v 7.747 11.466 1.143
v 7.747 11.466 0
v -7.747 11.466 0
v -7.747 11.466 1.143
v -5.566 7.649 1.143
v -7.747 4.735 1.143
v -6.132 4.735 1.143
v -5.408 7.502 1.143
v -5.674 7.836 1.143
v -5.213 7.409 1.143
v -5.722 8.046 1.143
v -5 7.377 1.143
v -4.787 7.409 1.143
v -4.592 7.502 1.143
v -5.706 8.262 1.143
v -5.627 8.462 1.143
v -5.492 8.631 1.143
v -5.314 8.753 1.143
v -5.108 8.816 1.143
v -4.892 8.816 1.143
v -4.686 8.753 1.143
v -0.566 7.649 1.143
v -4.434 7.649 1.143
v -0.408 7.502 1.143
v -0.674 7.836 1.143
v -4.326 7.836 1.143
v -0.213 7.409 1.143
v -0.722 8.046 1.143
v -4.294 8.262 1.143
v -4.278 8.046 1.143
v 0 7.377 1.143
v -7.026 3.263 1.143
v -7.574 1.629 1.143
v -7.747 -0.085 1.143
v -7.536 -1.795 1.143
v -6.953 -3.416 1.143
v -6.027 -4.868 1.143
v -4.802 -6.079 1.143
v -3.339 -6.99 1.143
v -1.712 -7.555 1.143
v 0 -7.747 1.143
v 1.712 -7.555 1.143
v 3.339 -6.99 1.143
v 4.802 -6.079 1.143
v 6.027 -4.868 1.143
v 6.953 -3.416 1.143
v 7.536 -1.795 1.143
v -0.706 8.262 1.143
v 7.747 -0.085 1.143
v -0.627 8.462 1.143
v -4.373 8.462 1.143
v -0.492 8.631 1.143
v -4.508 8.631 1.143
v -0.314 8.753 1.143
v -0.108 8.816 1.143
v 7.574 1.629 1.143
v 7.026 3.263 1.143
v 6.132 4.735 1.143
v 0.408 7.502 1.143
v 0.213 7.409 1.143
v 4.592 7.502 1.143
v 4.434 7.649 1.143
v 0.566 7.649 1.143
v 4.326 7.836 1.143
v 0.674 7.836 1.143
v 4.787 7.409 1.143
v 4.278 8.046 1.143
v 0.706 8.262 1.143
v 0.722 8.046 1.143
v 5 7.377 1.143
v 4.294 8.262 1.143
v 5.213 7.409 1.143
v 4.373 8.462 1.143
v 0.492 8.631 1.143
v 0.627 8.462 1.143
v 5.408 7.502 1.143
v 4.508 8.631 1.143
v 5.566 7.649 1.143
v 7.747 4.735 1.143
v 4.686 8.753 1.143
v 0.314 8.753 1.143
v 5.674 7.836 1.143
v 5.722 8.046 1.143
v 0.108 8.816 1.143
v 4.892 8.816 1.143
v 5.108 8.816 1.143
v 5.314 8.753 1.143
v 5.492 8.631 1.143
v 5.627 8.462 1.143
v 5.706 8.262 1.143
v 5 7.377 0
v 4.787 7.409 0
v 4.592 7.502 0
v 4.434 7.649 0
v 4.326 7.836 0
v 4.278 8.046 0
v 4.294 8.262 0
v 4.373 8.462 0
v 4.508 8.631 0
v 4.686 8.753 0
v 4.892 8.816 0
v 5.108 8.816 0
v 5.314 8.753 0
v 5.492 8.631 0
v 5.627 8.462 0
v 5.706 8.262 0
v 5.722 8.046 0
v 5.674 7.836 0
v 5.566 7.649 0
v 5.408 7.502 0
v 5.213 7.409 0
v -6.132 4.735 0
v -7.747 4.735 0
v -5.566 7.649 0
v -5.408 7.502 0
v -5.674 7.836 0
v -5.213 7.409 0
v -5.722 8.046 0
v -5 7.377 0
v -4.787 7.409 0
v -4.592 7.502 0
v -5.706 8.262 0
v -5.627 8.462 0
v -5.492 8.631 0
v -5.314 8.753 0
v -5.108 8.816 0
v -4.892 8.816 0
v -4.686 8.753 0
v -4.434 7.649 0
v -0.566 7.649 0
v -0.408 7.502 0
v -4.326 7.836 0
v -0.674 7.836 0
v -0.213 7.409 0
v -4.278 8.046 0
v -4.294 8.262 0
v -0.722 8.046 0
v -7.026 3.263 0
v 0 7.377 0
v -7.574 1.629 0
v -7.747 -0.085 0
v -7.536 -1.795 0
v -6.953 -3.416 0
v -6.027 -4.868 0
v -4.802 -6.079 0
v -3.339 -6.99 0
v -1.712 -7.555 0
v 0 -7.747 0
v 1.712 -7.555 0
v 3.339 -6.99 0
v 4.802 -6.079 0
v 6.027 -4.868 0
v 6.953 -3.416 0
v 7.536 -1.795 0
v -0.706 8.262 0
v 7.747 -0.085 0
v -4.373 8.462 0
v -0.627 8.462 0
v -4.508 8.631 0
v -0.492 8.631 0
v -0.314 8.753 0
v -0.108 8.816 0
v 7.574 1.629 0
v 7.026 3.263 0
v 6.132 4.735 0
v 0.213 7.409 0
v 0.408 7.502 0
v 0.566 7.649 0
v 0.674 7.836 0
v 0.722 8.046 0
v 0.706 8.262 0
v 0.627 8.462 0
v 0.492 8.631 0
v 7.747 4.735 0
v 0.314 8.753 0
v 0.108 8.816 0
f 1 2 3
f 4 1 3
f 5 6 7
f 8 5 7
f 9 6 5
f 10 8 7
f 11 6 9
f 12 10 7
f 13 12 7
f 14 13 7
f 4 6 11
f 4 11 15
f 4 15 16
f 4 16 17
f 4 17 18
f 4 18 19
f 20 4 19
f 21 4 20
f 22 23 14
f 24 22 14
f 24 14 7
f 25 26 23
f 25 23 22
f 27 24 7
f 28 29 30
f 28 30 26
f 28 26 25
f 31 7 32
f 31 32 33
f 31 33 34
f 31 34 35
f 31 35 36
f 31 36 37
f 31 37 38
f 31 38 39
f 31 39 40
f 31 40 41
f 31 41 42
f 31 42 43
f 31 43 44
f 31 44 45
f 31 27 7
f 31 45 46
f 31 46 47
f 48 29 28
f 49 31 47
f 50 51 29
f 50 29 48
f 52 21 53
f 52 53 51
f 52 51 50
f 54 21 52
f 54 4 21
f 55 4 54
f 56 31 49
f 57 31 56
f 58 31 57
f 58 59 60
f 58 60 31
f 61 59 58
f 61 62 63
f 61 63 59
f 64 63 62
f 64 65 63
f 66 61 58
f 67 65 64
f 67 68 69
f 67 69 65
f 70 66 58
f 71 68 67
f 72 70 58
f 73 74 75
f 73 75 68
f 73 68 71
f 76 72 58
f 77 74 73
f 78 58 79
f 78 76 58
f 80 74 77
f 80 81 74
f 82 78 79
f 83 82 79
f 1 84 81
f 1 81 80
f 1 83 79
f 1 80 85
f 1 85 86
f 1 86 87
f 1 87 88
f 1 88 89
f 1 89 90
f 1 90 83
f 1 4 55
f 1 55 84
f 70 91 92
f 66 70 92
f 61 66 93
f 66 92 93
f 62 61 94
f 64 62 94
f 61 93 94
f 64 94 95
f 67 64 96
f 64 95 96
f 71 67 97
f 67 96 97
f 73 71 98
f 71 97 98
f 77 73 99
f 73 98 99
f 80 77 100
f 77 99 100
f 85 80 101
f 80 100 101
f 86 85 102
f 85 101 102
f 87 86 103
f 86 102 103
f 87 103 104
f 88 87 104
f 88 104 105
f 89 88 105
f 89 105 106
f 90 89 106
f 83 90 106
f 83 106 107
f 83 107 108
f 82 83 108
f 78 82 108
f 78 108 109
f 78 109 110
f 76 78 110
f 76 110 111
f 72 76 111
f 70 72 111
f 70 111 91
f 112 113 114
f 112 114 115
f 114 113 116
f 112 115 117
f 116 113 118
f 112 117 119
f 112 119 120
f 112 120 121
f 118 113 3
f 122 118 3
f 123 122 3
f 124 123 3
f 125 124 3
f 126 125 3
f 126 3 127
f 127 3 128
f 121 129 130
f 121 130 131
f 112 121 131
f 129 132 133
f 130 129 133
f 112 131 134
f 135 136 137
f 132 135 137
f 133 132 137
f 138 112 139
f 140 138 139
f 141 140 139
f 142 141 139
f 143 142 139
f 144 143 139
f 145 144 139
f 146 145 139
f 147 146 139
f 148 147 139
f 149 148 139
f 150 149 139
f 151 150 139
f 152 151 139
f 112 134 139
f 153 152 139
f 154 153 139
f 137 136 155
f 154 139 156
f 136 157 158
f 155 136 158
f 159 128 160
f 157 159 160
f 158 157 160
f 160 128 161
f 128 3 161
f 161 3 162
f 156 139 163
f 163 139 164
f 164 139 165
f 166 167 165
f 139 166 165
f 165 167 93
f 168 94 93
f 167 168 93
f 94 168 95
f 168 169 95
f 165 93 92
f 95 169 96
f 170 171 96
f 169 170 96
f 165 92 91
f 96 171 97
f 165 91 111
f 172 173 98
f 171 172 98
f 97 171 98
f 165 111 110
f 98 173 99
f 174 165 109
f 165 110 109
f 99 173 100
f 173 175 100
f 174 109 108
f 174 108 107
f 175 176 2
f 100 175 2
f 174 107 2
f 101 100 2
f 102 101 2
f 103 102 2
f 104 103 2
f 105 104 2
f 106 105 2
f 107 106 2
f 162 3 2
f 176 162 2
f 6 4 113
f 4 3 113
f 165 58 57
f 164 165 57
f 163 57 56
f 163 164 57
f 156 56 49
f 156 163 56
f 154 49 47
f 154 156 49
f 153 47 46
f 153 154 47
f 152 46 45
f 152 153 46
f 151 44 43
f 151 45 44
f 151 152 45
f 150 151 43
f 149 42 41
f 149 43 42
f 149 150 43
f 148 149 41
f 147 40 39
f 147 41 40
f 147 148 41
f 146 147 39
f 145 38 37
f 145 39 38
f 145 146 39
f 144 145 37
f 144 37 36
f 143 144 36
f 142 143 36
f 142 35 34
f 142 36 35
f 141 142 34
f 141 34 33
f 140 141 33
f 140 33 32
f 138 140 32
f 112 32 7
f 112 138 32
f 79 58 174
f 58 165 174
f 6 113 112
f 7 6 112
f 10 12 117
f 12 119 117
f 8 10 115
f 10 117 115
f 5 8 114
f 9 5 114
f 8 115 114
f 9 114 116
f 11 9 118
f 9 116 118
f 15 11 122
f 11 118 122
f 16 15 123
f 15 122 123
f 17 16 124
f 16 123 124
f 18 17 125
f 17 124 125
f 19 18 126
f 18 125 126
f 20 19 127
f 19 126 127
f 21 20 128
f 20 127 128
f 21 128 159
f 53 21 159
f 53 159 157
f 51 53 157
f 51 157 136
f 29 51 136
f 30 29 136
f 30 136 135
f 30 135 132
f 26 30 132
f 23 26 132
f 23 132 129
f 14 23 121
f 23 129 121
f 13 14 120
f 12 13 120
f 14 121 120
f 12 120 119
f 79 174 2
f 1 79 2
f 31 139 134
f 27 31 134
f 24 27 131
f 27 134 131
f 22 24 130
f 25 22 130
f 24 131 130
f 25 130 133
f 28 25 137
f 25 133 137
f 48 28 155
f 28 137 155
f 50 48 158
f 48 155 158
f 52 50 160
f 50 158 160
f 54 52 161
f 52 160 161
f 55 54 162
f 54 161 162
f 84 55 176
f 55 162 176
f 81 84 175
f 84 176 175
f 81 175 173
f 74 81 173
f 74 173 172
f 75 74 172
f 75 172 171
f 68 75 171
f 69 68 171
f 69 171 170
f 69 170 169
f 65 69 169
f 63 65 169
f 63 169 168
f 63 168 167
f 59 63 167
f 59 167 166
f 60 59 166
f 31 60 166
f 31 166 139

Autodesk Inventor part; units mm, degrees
ref_plane "YZ Plane" through (0, 0, 0) normal (1, 0, 0) x (0, 1, 0)
ref_plane "XZ Plane" through (0, 0, 0) normal (0, 1, 0) x (-1, 0, 0)
ref_plane "XY Plane" through (0, 0, 0) normal (0, 0, 1) x (1, 0, 0)
sketch "Sketch1" plane through (0, 0, 0) normal (0, 0, 1) x (1, 0, 0)
  arc A0 (-6.1315, 4.735) -> (6.1315, 4.735) centre (0, 0) ccw
  line L0 (0, 0) -> (13.0157, 0) construction
  line L1 (7.747, 4.735) -> (7.747, 11.466)
  line L2 (7.747, 11.466) -> (-7.747, 11.466)
  line L3 (-7.747, 11.466) -> (-7.747, 4.735)
  line L4 (-7.747, 4.735) -> (-6.1315, 4.735)
  line L5 (6.1315, 4.735) -> (7.747, 4.735)
  dimension "d0" = 15.494
  dimension "d1" = 6.731
  dimension "d2" = 15.494
  dimension "d3" = 7.747
extrude "Extrusion1" add sketch "Sketch1" along normal blind 1.143
sketch "Sketch2" plane through (0, 0, 1.143) normal (0, 0, 1) x (1, 0, 0)
  line L0 (7.747, 11.466) -> (-7.747, 11.466) projected
  point P0 (-7.747, 4.735)
  point P1 (-5, 8.1005)
  point P2 (0, 8.1005)
  point P3 (5, 8.1005)
  dimension "d6" = 5
  dimension "d7" = 5
  dimension "d8" = 6.731
  dimension "d9" = 3.3655
hole "Hole1" at (-5, 8.1005, 1.143) at (0, 8.1005, 1.143) at (5, 8.1005, 1.143) direction (0, 0, -1) diameter 1.4478 end through all
equation "\"d3\" = 0.5 * d2"
equation "\"d9\" = 0.5 * d8"
properties part number "Potenciometro - Base"
